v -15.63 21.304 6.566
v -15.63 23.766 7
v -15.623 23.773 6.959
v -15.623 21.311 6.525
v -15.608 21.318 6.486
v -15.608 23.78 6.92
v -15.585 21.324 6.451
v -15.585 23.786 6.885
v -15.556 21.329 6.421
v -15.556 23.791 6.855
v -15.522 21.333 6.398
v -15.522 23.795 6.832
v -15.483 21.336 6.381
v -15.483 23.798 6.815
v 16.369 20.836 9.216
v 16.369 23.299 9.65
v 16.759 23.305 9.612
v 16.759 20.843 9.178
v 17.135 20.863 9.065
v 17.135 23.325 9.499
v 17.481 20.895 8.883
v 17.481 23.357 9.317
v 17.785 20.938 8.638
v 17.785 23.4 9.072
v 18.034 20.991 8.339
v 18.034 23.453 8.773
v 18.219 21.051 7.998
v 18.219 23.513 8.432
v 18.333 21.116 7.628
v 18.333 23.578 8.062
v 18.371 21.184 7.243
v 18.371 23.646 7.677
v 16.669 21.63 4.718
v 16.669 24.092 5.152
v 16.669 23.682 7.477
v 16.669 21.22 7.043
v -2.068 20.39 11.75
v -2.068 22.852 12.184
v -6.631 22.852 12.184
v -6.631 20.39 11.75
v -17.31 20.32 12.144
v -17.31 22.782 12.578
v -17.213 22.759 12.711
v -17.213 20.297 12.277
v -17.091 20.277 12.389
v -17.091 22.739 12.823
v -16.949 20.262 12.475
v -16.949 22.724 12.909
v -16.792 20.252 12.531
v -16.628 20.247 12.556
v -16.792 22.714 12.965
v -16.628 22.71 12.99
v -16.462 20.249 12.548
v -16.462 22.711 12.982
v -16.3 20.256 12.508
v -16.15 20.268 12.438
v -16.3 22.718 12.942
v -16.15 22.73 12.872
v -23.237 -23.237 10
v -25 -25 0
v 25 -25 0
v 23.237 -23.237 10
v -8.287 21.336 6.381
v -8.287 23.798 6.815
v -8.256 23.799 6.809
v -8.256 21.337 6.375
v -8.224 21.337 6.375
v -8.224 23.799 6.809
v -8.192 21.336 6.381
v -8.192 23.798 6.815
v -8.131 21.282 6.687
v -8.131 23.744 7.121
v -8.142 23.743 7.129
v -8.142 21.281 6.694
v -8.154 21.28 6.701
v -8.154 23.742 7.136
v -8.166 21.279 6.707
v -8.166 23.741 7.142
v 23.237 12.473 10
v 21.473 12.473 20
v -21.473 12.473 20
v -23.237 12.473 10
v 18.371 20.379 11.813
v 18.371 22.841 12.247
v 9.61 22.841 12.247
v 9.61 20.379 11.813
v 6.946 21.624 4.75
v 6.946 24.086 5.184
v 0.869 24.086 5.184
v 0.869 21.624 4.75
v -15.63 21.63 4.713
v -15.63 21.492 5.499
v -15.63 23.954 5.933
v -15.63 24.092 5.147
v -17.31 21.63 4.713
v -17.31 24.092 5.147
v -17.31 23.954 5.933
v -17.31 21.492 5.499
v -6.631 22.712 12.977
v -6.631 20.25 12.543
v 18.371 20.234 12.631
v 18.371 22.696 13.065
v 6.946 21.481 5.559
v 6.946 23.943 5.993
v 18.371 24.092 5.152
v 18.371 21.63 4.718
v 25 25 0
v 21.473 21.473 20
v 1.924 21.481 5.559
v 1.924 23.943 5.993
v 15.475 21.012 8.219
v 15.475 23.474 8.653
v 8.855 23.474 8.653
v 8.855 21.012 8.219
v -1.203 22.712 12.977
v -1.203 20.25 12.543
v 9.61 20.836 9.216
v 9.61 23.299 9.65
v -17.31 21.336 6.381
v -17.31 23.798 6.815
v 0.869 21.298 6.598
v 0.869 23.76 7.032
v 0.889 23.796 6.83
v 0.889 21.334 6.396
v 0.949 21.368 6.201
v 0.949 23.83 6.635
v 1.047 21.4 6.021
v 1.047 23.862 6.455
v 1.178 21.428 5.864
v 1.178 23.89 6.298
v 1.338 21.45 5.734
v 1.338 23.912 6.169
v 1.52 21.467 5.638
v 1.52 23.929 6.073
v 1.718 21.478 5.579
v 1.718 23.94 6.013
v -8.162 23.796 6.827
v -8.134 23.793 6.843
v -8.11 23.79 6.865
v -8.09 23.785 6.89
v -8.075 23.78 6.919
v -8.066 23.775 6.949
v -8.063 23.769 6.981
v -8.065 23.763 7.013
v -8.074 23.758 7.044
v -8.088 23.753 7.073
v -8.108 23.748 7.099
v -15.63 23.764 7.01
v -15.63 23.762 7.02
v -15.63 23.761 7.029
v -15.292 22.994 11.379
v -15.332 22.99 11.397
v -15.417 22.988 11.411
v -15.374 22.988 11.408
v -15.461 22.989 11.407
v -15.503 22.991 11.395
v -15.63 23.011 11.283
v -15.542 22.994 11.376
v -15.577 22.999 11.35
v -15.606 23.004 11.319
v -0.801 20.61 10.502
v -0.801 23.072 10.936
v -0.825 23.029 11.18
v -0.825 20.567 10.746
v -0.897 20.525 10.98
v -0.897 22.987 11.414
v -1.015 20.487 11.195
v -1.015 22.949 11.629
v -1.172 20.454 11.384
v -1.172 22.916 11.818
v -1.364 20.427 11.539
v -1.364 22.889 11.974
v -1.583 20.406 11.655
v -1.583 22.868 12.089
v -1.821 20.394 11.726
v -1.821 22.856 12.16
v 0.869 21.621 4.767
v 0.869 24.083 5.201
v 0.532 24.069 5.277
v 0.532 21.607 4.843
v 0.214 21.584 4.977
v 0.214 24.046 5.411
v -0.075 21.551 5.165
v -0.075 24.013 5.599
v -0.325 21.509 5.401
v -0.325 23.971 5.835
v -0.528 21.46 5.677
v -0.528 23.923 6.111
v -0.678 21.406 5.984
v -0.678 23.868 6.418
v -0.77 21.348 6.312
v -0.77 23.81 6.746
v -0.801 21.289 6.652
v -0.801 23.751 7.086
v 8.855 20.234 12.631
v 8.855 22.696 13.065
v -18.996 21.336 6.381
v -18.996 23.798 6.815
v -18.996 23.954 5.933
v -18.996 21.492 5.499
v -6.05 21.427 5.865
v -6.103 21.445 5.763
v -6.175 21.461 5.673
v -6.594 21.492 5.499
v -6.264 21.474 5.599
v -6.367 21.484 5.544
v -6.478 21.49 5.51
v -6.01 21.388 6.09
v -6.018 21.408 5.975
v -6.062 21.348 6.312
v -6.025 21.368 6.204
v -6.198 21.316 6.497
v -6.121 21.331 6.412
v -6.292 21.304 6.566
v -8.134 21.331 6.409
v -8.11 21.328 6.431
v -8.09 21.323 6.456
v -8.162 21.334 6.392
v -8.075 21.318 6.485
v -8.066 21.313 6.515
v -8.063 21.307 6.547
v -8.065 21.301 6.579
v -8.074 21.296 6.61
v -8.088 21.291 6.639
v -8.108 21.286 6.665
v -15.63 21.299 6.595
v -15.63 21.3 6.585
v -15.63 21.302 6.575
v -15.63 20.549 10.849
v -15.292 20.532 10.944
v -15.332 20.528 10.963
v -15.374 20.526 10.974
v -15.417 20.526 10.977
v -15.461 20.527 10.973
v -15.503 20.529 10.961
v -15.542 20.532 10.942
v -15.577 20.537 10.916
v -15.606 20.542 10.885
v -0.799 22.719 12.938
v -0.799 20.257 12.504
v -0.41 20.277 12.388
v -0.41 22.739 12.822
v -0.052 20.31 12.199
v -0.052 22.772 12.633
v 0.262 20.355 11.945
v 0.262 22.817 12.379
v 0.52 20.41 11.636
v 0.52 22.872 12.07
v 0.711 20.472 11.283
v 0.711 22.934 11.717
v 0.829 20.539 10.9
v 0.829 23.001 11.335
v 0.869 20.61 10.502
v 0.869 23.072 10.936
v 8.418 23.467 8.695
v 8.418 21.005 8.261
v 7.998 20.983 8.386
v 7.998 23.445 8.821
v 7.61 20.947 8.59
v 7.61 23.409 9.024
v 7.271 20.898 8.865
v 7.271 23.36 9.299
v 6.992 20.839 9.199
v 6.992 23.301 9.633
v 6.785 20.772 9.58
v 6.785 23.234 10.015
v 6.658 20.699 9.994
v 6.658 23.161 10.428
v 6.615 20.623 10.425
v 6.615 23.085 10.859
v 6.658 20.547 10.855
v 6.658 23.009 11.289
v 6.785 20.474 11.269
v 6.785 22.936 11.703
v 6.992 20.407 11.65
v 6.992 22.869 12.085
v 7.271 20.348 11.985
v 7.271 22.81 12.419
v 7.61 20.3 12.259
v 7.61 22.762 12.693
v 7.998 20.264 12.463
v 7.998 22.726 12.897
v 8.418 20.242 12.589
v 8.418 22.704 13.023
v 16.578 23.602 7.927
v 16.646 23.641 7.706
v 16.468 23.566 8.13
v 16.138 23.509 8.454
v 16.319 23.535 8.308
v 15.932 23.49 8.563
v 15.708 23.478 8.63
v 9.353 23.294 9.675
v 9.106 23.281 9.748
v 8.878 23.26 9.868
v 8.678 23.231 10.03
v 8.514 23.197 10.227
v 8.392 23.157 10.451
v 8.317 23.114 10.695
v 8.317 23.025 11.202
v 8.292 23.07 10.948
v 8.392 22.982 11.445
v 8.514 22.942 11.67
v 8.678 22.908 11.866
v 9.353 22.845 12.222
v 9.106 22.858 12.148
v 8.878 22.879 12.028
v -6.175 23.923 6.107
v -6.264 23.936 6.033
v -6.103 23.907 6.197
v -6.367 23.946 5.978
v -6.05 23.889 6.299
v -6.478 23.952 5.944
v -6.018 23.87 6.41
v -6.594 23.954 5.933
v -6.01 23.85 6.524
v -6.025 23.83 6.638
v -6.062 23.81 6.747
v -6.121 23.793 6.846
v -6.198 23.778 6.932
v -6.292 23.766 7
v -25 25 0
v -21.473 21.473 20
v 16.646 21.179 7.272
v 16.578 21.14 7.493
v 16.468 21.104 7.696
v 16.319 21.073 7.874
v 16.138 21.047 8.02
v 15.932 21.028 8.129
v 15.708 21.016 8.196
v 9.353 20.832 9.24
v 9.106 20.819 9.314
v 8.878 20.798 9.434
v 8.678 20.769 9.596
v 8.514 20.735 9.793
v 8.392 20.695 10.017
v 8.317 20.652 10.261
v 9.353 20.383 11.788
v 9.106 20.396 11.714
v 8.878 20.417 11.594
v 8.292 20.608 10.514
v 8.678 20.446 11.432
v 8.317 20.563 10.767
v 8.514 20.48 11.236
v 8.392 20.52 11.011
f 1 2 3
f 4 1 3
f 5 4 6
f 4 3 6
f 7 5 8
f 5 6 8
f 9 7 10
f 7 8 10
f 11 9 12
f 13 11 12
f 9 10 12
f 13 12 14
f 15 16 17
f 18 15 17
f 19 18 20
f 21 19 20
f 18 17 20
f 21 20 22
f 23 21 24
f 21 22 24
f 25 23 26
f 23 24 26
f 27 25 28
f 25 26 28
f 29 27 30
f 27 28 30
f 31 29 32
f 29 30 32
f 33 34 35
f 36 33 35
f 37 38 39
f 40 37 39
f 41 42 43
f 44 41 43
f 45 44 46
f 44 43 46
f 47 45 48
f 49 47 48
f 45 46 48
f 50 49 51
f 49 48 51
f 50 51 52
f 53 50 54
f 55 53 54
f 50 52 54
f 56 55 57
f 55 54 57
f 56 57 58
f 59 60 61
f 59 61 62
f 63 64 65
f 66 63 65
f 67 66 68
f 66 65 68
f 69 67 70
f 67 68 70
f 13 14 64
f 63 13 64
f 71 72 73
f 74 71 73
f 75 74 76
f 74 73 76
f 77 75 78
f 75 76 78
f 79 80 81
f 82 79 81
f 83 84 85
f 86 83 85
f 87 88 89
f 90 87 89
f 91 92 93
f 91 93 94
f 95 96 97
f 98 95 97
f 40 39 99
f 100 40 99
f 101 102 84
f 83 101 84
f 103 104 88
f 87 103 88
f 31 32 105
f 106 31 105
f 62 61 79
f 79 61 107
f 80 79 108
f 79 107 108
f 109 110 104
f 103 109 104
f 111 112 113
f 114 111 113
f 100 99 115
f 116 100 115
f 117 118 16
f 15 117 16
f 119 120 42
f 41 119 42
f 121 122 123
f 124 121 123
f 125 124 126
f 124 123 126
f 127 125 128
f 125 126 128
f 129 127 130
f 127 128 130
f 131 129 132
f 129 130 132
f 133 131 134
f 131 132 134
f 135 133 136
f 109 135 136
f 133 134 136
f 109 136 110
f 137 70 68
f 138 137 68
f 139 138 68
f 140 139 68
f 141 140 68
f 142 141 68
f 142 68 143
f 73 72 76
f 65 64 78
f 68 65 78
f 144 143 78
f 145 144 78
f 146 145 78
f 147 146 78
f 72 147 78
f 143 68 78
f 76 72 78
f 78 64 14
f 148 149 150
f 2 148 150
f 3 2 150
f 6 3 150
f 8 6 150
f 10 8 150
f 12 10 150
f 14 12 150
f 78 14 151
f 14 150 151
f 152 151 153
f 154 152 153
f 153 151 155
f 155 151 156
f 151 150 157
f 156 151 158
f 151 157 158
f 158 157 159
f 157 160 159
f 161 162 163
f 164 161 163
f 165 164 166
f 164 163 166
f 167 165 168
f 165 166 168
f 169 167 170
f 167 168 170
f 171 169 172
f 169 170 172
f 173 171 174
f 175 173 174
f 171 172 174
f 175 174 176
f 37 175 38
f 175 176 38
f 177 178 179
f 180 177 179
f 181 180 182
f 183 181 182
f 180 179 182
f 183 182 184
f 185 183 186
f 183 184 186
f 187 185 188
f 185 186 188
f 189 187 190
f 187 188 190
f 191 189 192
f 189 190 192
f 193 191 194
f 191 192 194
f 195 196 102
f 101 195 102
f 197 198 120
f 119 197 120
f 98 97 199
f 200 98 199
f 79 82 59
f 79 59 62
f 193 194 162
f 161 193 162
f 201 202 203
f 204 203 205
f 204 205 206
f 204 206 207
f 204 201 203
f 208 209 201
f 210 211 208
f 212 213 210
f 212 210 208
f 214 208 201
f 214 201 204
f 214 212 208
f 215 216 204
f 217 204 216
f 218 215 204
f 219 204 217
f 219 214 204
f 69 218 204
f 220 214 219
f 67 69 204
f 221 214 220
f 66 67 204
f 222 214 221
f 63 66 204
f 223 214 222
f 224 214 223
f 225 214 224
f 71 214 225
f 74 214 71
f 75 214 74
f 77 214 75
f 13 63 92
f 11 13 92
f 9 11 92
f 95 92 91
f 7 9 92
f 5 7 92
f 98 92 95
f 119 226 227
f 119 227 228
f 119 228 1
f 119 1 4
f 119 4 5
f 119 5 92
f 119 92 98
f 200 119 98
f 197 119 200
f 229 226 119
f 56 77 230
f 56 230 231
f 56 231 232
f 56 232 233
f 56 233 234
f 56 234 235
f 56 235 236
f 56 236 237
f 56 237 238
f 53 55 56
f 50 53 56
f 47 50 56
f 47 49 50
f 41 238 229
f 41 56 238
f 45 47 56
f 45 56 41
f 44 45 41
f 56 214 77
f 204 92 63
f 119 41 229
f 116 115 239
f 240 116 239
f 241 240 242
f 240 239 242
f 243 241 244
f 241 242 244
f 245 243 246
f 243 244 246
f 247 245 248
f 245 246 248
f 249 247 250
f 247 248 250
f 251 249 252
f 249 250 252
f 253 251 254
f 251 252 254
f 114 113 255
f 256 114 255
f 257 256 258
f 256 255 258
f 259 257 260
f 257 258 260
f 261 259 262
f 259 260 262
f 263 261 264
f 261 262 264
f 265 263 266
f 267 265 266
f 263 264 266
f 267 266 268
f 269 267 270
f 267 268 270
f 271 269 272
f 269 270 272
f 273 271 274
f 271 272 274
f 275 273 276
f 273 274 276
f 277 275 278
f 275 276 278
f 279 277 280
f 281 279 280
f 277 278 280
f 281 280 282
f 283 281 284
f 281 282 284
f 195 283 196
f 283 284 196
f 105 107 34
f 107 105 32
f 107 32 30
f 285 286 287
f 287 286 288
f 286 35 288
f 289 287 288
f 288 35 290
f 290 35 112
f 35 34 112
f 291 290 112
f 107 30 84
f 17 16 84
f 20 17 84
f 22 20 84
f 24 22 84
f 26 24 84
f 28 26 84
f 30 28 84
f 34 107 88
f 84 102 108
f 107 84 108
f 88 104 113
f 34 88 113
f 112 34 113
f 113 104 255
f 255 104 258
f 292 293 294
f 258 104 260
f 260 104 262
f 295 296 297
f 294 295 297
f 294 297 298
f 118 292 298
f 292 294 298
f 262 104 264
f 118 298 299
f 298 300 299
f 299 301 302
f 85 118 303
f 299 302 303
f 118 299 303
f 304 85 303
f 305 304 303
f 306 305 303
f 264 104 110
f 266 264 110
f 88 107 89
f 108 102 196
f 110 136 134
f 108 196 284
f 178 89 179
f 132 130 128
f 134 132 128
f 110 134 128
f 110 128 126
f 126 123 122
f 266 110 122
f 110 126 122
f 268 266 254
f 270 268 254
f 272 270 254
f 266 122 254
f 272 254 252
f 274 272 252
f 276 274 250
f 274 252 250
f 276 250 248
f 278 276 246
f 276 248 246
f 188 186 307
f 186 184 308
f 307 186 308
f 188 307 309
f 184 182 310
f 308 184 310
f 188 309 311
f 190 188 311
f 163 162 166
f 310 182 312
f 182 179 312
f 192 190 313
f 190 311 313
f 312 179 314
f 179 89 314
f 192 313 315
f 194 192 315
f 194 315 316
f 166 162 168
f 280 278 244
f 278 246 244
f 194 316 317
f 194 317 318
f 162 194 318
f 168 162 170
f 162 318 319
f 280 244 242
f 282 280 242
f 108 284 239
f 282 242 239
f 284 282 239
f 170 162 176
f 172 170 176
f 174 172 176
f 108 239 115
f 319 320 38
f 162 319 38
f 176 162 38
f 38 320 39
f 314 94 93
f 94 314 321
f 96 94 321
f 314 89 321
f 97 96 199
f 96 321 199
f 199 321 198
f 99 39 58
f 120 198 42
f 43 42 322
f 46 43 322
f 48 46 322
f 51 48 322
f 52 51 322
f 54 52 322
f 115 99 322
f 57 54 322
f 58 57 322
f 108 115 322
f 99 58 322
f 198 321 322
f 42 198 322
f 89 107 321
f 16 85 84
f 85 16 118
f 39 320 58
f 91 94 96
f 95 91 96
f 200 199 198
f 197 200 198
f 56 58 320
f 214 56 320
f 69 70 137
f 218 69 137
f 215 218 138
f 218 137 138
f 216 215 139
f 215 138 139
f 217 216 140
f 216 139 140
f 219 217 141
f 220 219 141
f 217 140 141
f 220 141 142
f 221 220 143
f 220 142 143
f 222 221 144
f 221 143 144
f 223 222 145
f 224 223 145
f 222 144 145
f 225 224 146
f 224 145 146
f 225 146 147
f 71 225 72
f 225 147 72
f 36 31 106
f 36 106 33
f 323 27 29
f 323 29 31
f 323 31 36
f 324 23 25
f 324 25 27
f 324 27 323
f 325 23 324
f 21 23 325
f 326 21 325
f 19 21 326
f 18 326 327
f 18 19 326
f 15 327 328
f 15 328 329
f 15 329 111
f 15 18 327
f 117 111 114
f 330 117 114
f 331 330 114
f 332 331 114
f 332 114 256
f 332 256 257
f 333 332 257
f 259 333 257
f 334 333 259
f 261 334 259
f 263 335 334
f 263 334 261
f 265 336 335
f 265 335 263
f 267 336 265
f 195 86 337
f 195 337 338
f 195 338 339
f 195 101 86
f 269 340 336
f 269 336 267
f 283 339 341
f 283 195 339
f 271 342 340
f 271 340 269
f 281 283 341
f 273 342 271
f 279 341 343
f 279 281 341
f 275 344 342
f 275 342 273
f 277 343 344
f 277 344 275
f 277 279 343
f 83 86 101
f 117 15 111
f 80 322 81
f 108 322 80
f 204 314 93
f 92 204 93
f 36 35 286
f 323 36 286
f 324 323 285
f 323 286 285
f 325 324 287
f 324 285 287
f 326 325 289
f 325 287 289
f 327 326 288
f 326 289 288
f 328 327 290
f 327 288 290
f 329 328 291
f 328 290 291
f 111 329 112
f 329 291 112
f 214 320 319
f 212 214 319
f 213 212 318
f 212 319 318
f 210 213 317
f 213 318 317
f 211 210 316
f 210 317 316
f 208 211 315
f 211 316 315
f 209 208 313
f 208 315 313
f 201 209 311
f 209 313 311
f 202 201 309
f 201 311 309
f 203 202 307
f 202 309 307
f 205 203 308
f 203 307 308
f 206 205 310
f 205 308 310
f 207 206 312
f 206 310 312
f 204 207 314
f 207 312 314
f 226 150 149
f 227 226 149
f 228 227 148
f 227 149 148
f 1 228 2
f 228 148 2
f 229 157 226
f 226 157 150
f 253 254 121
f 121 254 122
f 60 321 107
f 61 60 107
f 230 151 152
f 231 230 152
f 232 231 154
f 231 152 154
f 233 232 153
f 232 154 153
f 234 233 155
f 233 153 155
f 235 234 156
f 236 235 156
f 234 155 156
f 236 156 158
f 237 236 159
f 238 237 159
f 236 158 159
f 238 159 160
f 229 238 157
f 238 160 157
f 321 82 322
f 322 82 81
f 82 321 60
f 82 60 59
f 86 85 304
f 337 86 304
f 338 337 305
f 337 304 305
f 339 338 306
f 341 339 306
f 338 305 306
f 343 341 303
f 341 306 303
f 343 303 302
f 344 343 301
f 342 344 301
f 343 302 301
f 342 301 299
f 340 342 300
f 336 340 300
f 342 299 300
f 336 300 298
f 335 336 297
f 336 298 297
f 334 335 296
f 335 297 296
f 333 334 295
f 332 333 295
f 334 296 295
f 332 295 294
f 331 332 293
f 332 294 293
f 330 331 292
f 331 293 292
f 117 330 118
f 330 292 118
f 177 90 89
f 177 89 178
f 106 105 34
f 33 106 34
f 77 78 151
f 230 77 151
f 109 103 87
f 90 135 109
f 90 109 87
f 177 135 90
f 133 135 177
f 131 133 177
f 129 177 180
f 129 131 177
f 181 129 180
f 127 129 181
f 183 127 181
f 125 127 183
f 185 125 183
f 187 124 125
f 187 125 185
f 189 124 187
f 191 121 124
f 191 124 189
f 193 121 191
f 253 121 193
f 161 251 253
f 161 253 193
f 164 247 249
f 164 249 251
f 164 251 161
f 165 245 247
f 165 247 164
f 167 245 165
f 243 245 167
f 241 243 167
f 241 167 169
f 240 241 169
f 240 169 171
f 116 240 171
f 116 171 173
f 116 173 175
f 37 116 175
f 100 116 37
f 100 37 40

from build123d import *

# Parameters (mm, degrees)
F0_W     = 50
F0_H     = 50
F1_DEPTH = 20
F1_TAPER = 10
F4_DEPTH = 2.5
F5_W     = 42.9469207717
F5_H     = 33.9469207717
F6_DEPTH = 10


with BuildPart() as f1:
    # F0 (on Top) → F1 (new body)
    with BuildSketch(Plane.XY):
        Rectangle(F0_W, F0_H)
    extrude(amount=F1_DEPTH, taper=F1_TAPER)

    # F3 (on face) → F4 (cut)
    with BuildSketch(Plane(origin=(0, 24.2461577598, 4.2752517916), x_dir=(-1, 0, 0), z_dir=(0, 0.984807753, 0.1736481777))):
        with BuildLine():
            ThreePointArc((-62.6127916525, 12.0467824013), (-65.1076142535, 12.9570129346), (-67.6967318406, 13.5478847947))
            Line((-67.6967318406, 13.5478847947), (-67.6967318406, 1.7008224913))
            Line((-67.6967318406, 1.7008224913), (-64.9974017565, 0.6510827954))
            Line((-64.9974017565, 0.6510827954), (-64.9974017565, 10.8966148214))
            ThreePointArc((-64.9974017565, 10.8966148214), (-64.4272854823, 11.4667310956), (-63.8571692081, 10.8966148214))
            Line((-63.8571692081, 10.8966148214), (-63.8571692081, 6.5746134929))
            ThreePointArc((-63.8571692081, 6.5746134929), (-63.1556576777, 6.2062071738), (-62.36370085, 6.1807901262))
            ThreePointArc((-62.36370085, 6.1807901262), (-61.4973256009, 6.5898476466), (-60.9304969783, 7.3622720376))
            ThreePointArc((-60.9304969783, 7.3622720376), (-60.8139105128, 8.6329221267), (-60.9304969783, 9.9035722157))
            ThreePointArc((-60.9304969783, 9.9035722157), (-61.4992901353, 11.1889594143), (-62.6127916525, 12.0467824013))
        make_face()
        with BuildLine():
            Line((-59.852306272, 4.1264343026), (-64.3468709521, 2.5074238792))
            Line((-64.3468709521, 2.5074238792), (-64.3468709521, 0.8903192669))
            Line((-64.3468709521, 0.8903192669), (-59.1967386775, 2.745475089))
            ThreePointArc((-59.1967386775, 2.745475089), (-58.3600263338, 3.0909475212), (-57.5693056666, 3.5316283287))
            ThreePointArc((-57.5693056666, 3.5316283287), (-57.2106825124, 3.8266438133), (-57.1279449174, 4.2835893169))
            ThreePointArc((-57.1279449174, 4.2835893169), (-57.2731405563, 4.626683197), (-57.5693056666, 4.8526951689))
            ThreePointArc((-57.5693056666, 4.8526951689), (-59.1391575222, 5.4515460975), (-60.8064195051, 5.6596200345))
            ThreePointArc((-60.8064195051, 5.6596200345), (-62.3430133295, 5.6105588901), (-63.8571692081, 5.3443643137))
            Line((-63.8571692081, 5.3443643137), (-64.3733816954, 5.1584167399))
            Line((-64.3733816954, 5.1584167399), (-64.3733816954, 3.567821243))
            Line((-64.3733816954, 3.567821243), (-61.5377031577, 4.5892756967))
            ThreePointArc((-61.5377031577, 4.5892756967), (-61.4484140803, 4.623308608), (-61.3579327635, 4.6540317215))
            ThreePointArc((-61.3579327635, 4.6540317215), (-60.7215197269, 4.7724043893), (-60.0756078839, 4.7296079809))
            ThreePointArc((-60.0756078839, 4.7296079809), (-59.8276638338, 4.6512158498), (-59.6342471347, 4.4774011246))
            ThreePointArc((-59.6342471347, 4.4774011246), (-59.607836679, 4.389638385), (-59.6342471347, 4.3018756454))
            ThreePointArc((-59.6342471347, 4.3018756454), (-59.7293419591, 4.1968352348), (-59.852306272, 4.1264343026))
        make_face()
        with BuildLine():
            Line((-61.5377031577, 4.5892756967), (-61.3579327635, 4.6540317215))
            ThreePointArc((-61.3579327635, 4.6540317215), (-61.4484140803, 4.623308608), (-61.5377031577, 4.5892756967))
        make_face()
        with BuildLine():
            Line((-71.3693953118, 3.7232309117), (-68.2338687675, 4.8526951689))
            Line((-68.2338687675, 4.8526951689), (-68.2338687675, 6.3986412263))
            Line((-68.2338687675, 6.3986412263), (-72.8589746057, 4.7326078963))
            ThreePointArc((-72.8589746057, 4.7326078963), (-73.3660543121, 4.4190102256), (-73.7959157464, 4.0058607672))
            ThreePointArc((-73.7959157464, 4.0058607672), (-73.8489158308, 3.7221286407), (-73.7959157464, 3.4383965142))
            ThreePointArc((-73.7959157464, 3.4383965142), (-73.5719055484, 3.0819711924), (-73.2075114709, 2.8711714412))
            ThreePointArc((-73.2075114709, 2.8711714412), (-72.698935386, 2.6276316569), (-72.151396822, 2.4928622925))
            ThreePointArc((-72.151396822, 2.4928622925), (-71.0199458053, 2.2564276603), (-69.8657767964, 2.1933670766))
            ThreePointArc((-69.8657767964, 2.1933670766), (-69.0466795364, 2.2155081429), (-68.2338687675, 2.3191865022))
            Line((-68.2338687675, 2.3191865022), (-68.2338687675, 3.7681726435))
            ThreePointArc((-68.2338687675, 3.7681726435), (-68.7127832674, 3.5843780991), (-69.2045442964, 3.4383965142))
            ThreePointArc((-69.2045442964, 3.4383965142), (-70.2705361783, 3.1526989385), (-71.3693953118, 3.2550239211))
            ThreePointArc((-71.3693953118, 3.2550239211), (-71.4727799338, 3.4891274164), (-71.3693953118, 3.7232309117))
        make_face()
        with BuildLine():
            Line((-8.8550038247, 8.9253647507), (-18.3714963496, 8.9253647507))
            Line((-18.3714963496, 8.9253647507), (-18.3714963496, 8.0944637033))
            Line((-18.3714963496, 8.0944637033), (-9.6104234449, 8.0944637033))
            ThreePointArc((-9.6104234449, 8.0944637033), (-8.2918347743, 6.7758750328), (-9.6104234449, 5.4572863622))
            Line((-9.6104234449, 5.4572863622), (-16.3685619547, 5.4572863622))
            ThreePointArc((-16.3685619547, 5.4572863622), (-17.7848504476, 4.8706404602), (-18.3714963496, 3.4543519673))
            Line((-18.3714963496, 3.4543519673), (-18.3714963496, 0.8903192669))
            Line((-18.3714963496, 0.8903192669), (-16.6691035906, 0.8903192669))
            Line((-16.6691035906, 0.8903192669), (-16.6691035906, 3.2509914089))
            ThreePointArc((-16.6691035906, 3.2509914089), (-16.3194164791, 4.0952107761), (-15.475197112, 4.4448978876))
            Line((-15.475197112, 4.4448978876), (-8.8550038247, 4.4448978876))
            ThreePointArc((-8.8550038247, 4.4448978876), (-6.6147703931, 6.6851313191), (-8.8550038247, 8.9253647507))
        make_face()
        with BuildLine():
            Line((6.6308597895, 8.0305831634), (6.6308597895, 8.8359827707))
            Line((6.6308597895, 8.8359827707), (1.2028706223, 8.8359827707))
            ThreePointArc((1.2028706223, 8.8359827707), (-0.2622622882, 8.2291048484), (-0.8691402105, 6.7639719379))
            Line((-0.8691402105, 6.7639719379), (-0.8691402105, 2.7997734057))
            ThreePointArc((-0.8691402105, 2.7997734057), (-1.1781523708, 2.0537520573), (-1.9241737192, 1.744739897))
            Line((-1.9241737192, 1.744739897), (-6.9461943019, 1.744739897))
            Line((-6.9461943019, 1.744739897), (-6.9461943019, 0.9224587447))
            Line((-6.9461943019, 0.9224587447), (-1.1303118512, 0.9224587447))
            ThreePointArc((-1.1303118512, 0.9224587447), (-0.9994251278, 0.9268988758), (-0.8691402105, 0.9401988537))
            ThreePointArc((-0.8691402105, 0.9401988537), (0.324782393, 1.5838337022), (0.8010555712, 2.8538261671))
            Line((0.8010555712, 2.8538261671), (0.8010555712, 6.7639719379))
            ThreePointArc((0.8010555712, 6.7639719379), (1.17203741, 7.6596013245), (2.0676667967, 8.0305831634))
            Line((2.0676667967, 8.0305831634), (6.6308597895, 8.0305831634))
        make_face()
        with BuildLine():
            Line((-0.8691402105, 0.9224587447), (-0.8691402105, 0.9401988537))
            ThreePointArc((-0.8691402105, 0.9401988537), (-0.9994251278, 0.9268988758), (-1.1303118512, 0.9224587447))
            Line((-1.1303118512, 0.9224587447), (-0.8691402105, 0.9224587447))
        make_face()
        with BuildLine():
            Line((16.1497702226, 8.7293623708), (6.2916715828, 2.7671895852))
            ThreePointArc((6.2916715828, 2.7671895852), (6.0312638327, 2.1103408421), (6.5940157184, 1.6830554777))
            Line((6.5940157184, 1.6830554777), (15.6298977944, 1.6830554777))
            Line((15.6298977944, 1.6830554777), (15.6298977944, 0.8854835551))
            Line((15.6298977944, 0.8854835551), (17.3096715009, 0.8854835551))
            Line((17.3096715009, 0.8854835551), (17.3096715009, 1.6830554777))
            Line((17.3096715009, 1.6830554777), (18.9957390394, 1.6830554777))
            Line((18.9957390394, 1.6830554777), (18.9957390394, 2.5790360808))
            Line((18.9957390394, 2.5790360808), (17.3096715009, 2.5790360808))
            Line((17.3096715009, 2.5790360808), (17.3096715009, 8.4309516424))
            ThreePointArc((17.3096715009, 8.4309516424), (16.7924307072, 8.8239057157), (16.1497702226, 8.7293623708))
        make_face()
        with BuildLine():
            ThreePointArc((15.6298977944, 2.7664388472), (15.5851471152, 2.650295301), (15.4830977637, 2.5790360808))
            Line((15.4830977637, 2.5790360808), (8.2873353154, 2.5790360808))
            ThreePointArc((8.2873353154, 2.5790360808), (8.2396752723, 2.5724973144), (8.1920152292, 2.5790360808))
            ThreePointArc((8.1920152292, 2.5790360808), (8.0660077379, 2.7154691755), (8.1312813761, 2.8893404766))
            ThreePointArc((8.1312813761, 2.8893404766), (8.1482094403, 2.900951867), (8.1663682644, 2.9105247899))
            Line((8.1663682644, 2.9105247899), (15.2921648042, 7.212847216))
            ThreePointArc((15.2921648042, 7.212847216), (15.4818399907, 7.2366014749), (15.6298977944, 7.1156889945))
            Line((15.6298977944, 7.1156889945), (15.6298977944, 2.7966582224))
            ThreePointArc((15.6298977944, 2.7966582224), (15.6304347873, 2.7815485348), (15.6298977944, 2.7664388472))
        make_face(mode=Mode.SUBTRACT)
    extrude(amount=-F4_DEPTH, mode=Mode.SUBTRACT)

    # F5 (on face) → F6 (cut)
    with BuildSketch(Plane.XY.offset(20)):
        Polygon((-21.4734603858, 12.4734603858), (-40, 12.4734603858), (-40, -37.5265396142), (40, -37.5265396142), (40, 12.4734603858), (21.4734603858, 12.4734603858), (21.4734603858, -21.4734603858), (-21.4734603858, -21.4734603858), align=None)
        with Locations((0, -4.5)):
            Rectangle(F5_W, F5_H)
    extrude(amount=-F6_DEPTH, mode=Mode.SUBTRACT)


solid = f1.part
